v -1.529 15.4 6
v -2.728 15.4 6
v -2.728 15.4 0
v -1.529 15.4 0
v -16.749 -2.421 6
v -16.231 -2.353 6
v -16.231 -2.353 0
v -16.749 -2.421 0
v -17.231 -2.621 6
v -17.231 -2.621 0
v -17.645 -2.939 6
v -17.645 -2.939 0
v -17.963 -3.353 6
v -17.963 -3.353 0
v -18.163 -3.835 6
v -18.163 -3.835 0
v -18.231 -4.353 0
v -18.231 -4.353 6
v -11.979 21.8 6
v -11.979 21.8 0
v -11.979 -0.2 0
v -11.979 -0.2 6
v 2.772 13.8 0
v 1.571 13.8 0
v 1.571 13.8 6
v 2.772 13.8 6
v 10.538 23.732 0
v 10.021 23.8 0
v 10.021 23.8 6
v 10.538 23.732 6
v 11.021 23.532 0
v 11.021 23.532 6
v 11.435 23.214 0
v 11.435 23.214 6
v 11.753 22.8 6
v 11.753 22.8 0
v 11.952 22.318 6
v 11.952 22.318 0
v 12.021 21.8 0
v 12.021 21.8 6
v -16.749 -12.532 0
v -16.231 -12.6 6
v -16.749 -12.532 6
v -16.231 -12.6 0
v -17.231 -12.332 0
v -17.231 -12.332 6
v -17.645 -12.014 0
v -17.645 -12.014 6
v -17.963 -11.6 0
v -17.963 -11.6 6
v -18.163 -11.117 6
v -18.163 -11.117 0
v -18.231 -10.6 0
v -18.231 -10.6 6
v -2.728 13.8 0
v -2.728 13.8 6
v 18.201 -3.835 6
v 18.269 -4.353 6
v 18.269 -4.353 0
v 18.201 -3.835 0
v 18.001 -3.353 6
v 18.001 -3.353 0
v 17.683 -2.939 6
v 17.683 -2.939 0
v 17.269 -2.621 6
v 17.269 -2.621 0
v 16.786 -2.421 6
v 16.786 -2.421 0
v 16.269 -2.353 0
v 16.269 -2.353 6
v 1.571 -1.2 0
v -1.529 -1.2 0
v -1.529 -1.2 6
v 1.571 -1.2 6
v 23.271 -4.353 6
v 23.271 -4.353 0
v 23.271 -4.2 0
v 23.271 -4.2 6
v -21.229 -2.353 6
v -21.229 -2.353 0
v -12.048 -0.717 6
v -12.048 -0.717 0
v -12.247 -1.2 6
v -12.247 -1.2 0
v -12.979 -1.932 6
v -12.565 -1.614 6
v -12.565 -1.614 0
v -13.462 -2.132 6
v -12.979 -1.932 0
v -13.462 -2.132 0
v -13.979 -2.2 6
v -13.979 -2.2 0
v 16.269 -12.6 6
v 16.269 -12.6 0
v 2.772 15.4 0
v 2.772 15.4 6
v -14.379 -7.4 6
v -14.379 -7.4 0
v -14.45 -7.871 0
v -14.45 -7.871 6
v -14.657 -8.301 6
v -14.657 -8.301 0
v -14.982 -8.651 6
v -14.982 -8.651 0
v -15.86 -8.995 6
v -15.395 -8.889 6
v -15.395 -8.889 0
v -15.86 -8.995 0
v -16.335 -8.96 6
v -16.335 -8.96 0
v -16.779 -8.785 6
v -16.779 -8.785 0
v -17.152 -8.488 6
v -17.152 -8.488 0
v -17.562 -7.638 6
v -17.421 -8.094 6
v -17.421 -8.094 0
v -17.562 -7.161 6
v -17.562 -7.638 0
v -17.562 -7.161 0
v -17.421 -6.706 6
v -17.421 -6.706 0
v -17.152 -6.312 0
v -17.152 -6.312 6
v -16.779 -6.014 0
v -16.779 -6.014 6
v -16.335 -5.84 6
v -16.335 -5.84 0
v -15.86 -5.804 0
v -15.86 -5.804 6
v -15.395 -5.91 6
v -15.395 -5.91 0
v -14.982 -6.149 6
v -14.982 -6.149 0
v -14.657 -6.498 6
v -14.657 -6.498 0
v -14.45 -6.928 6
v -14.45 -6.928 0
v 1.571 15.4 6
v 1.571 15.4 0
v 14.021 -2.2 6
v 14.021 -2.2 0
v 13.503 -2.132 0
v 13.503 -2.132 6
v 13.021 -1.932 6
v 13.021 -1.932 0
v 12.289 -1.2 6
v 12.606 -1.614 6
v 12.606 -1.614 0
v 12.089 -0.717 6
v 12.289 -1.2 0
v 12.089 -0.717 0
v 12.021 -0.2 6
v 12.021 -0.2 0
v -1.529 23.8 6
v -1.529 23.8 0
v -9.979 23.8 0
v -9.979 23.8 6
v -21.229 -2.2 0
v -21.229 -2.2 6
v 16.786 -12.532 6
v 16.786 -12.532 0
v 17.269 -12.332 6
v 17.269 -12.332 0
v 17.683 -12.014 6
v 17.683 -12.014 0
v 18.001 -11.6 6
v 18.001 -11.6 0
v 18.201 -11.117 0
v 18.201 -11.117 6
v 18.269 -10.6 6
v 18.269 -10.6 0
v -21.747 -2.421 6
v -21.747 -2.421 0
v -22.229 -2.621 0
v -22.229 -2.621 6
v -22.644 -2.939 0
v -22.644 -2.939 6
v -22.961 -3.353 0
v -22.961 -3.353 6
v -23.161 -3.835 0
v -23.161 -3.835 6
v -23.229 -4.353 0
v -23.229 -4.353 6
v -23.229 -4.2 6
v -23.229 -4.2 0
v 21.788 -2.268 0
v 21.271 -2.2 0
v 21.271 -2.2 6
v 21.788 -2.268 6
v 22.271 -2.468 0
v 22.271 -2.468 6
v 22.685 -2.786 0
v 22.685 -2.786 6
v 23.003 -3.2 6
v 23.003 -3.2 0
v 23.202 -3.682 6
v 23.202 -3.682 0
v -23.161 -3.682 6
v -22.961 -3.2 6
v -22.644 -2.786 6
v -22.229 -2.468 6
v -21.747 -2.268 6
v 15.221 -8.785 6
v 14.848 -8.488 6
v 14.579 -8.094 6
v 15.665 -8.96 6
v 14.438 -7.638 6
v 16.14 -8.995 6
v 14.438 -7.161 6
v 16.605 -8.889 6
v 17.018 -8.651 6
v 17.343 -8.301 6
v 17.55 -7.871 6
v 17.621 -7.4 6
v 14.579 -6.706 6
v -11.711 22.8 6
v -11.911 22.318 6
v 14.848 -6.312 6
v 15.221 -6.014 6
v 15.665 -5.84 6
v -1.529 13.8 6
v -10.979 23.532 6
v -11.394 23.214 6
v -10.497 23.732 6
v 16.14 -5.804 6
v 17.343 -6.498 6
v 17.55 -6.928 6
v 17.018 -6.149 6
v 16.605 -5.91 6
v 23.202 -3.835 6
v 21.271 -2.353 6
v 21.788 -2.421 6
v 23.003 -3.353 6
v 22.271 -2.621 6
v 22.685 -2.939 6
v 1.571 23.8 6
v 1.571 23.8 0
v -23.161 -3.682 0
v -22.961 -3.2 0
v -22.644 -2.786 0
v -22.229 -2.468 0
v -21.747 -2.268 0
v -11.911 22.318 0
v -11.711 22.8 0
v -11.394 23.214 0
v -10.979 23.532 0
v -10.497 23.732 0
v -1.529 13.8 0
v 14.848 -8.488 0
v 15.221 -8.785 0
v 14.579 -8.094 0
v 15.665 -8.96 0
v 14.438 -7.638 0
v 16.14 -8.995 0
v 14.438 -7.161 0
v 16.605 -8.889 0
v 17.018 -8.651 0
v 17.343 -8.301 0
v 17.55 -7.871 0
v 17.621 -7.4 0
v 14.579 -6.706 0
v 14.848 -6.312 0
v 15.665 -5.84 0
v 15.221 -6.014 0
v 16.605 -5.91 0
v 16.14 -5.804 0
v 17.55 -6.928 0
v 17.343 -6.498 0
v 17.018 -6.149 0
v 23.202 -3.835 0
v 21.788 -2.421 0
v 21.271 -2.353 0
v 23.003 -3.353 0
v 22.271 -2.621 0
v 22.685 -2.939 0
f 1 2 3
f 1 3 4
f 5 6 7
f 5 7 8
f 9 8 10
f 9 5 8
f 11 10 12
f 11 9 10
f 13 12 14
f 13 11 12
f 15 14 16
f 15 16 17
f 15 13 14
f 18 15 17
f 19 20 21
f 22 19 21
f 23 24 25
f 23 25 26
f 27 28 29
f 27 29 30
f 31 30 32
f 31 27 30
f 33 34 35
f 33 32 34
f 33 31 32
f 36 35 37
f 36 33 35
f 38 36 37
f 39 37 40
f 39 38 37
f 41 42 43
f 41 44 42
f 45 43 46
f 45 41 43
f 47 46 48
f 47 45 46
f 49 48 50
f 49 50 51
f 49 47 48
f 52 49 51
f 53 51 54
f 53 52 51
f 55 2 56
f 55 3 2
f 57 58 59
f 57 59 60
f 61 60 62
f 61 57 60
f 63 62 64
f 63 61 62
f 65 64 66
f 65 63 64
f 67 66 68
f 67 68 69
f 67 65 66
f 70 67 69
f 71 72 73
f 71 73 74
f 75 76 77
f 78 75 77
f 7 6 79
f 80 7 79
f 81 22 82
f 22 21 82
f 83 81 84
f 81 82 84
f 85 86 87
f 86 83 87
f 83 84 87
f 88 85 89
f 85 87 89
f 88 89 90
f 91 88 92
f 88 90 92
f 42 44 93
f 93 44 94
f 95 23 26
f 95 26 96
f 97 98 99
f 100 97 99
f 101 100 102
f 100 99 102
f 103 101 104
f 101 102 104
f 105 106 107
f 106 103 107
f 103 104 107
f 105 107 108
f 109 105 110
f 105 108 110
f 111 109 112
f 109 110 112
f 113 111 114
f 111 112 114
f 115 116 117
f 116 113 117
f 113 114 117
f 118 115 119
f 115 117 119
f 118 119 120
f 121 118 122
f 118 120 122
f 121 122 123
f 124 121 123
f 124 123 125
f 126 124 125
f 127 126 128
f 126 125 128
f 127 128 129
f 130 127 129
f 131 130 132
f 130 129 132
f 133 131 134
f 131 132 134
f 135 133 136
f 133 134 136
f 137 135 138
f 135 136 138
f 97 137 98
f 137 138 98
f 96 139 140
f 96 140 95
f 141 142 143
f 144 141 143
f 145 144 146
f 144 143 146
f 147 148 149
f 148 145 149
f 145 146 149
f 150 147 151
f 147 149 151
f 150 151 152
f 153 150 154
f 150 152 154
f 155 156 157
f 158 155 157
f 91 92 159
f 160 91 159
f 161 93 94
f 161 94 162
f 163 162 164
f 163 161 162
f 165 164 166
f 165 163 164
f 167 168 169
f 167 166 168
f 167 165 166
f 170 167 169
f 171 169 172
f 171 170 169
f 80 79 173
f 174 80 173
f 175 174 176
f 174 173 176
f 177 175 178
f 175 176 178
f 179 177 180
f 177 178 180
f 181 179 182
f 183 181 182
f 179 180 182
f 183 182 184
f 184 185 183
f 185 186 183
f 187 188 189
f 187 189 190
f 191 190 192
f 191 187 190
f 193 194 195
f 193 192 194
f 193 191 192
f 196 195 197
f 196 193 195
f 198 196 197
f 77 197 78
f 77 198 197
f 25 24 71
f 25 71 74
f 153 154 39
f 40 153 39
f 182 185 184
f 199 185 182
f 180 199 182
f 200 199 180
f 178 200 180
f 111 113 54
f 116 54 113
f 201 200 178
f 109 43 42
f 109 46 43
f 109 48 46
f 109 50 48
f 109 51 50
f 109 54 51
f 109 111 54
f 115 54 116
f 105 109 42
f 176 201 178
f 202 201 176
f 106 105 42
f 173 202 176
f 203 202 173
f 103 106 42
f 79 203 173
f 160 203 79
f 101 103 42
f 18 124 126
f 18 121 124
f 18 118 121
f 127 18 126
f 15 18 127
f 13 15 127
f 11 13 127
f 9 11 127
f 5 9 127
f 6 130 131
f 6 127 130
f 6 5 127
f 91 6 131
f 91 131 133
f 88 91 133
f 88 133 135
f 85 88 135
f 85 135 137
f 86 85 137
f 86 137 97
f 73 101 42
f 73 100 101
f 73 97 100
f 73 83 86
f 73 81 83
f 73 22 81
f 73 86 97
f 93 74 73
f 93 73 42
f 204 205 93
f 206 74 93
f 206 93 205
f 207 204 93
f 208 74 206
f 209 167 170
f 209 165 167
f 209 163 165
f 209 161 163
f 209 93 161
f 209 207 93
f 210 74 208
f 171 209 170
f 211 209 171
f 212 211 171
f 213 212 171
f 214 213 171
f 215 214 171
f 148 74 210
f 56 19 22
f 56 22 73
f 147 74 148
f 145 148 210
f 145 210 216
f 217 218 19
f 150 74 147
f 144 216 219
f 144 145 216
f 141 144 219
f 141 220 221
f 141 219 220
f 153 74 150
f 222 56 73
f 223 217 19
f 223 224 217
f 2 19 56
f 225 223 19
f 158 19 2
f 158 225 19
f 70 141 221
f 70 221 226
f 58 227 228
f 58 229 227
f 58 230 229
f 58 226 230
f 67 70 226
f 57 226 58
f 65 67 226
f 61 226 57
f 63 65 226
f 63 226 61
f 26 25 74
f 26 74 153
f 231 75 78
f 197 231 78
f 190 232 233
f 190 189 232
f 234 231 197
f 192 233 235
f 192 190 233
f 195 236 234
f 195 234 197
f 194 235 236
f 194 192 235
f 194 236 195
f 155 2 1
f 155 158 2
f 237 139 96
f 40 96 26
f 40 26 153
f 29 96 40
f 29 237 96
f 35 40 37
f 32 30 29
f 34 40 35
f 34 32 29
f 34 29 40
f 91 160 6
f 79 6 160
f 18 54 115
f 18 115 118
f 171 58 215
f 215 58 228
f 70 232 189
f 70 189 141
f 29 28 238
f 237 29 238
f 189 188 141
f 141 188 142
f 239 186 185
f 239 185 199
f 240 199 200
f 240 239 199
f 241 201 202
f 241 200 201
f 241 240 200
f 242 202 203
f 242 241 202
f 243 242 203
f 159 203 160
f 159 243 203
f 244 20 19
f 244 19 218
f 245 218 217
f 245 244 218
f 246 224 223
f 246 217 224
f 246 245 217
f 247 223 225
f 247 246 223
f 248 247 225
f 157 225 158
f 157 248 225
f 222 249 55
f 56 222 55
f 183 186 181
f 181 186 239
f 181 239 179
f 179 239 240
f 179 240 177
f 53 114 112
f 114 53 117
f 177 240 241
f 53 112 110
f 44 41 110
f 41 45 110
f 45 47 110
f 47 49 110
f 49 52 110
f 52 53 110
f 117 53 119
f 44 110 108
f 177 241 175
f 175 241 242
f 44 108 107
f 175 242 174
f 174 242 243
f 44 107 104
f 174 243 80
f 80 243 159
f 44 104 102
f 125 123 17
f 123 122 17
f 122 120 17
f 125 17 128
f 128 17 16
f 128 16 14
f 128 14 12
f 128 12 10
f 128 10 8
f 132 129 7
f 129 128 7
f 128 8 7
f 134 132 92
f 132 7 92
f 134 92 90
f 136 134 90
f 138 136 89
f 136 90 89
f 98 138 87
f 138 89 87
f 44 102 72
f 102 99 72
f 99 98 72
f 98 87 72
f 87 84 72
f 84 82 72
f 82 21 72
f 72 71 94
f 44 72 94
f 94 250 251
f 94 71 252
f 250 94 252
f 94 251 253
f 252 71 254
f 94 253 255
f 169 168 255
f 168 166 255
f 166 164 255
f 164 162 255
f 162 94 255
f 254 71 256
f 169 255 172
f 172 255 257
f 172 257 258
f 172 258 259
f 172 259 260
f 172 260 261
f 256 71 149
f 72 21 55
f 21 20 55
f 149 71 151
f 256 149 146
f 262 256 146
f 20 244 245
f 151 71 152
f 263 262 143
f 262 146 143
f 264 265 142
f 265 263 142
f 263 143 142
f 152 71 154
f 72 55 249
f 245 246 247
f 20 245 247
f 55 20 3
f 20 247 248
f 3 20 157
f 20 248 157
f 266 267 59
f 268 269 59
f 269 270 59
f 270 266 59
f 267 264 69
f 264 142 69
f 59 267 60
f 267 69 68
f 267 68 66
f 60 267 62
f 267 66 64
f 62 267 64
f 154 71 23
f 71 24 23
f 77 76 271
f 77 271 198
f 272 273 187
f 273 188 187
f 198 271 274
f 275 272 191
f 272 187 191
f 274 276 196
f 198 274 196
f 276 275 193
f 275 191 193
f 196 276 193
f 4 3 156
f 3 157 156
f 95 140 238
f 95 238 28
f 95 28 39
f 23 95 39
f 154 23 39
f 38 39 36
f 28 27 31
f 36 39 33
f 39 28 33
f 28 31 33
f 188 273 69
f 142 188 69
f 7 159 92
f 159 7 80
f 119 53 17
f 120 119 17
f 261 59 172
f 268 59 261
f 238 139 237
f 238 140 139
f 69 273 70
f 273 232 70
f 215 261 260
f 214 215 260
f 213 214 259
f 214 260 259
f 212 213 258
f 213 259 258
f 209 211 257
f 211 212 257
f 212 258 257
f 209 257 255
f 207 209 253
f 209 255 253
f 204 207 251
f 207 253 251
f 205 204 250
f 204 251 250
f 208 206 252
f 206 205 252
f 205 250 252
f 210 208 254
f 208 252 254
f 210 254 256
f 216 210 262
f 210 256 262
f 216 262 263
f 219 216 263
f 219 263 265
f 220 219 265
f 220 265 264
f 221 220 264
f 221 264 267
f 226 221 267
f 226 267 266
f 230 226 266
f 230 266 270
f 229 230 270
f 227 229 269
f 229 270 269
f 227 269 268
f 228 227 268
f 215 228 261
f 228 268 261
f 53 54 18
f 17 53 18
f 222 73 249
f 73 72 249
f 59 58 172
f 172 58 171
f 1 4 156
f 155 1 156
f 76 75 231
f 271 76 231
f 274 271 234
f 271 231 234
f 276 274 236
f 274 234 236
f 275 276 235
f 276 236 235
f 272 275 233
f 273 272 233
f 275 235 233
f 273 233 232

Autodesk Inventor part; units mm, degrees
ref_plane "YZ Plane" through (0, 0, 0) normal (1, 0, 0) x (0, 1, 0)
ref_plane "XZ Plane" through (0, 0, 0) normal (0, 1, 0) x (-1, 0, 0)
ref_plane "XY Plane" through (0, 0, 0) normal (0, 0, 1) x (1, 0, 0)
sketch "Sketch1" plane through (0, 0, 0) normal (0, 0, 1) x (1, 0, 0)
  line L0 (-21.2294, -12.5998) -> (21.2706, -12.5998)
  line L1 (23.2706, -10.5998) -> (23.2706, -4.1998)
  line L2 (-23.2294, -4.1998) -> (-23.2294, -10.5998)
  line L3 (12.0206, -0.1998) -> (12.0206, 21.8002)
  line L4 (10.0206, 23.8002) -> (-9.9794, 23.8002)
  line L5 (-11.9794, 21.8002) -> (-11.9794, -0.1998)
  circle A0 centre (16.0206, -7.3998) radius 1.6
  circle A1 centre (-15.9794, -7.3998) radius 1.6
  line L6 (21.2706, -2.1998) -> (14.0206, -2.1998)
  line L7 (-13.9794, -2.1998) -> (-21.2294, -2.1998)
  line L8 (0.0206, 11.8002) -> (-1.5294, 11.8002)
  line L9 (-1.5294, 11.8002) -> (1.5706, 11.8002)
  line L10 (-1.5294, 11.8002) -> (-1.5294, 13.8002)
  line L11 (-1.5294, 13.8002) -> (-2.7282, 13.8002)
  line L12 (2.7718, 13.8002) -> (2.7718, 15.8002)
  line L13 (-2.7282, 15.8002) -> (-2.7282, 13.8002)
  line L14 (-2.7282, 15.8002) -> (-1.5294, 15.8002)
  line L15 (0.0206, 15.8002) -> (0.0218, 15.8002)
  line L16 (2.7718, 15.8002) -> (1.5706, 15.8002)
  line L17 (-1.5294, 15.8002) -> (-2.7282, 15.8002)
  line L18 (-1.5294, 11.8002) -> (-1.5294, 13.8002)
  line L19 (-1.5294, 15.8002) -> (-1.5294, 23.8002)
  line L20 (-2.7282, 13.8002) -> (-1.5294, 13.8002)
  line L21 (1.5706, 13.8002) -> (2.7718, 13.8002)
  line L22 (1.5706, 11.8002) -> (1.5706, 13.8002)
  line L23 (1.5706, 15.8002) -> (1.5706, 23.8002)
  arc A2 (23.2706, -4.1998) -> (21.2706, -2.1998) centre (21.2706, -4.1998) ccw
  arc A3 (21.2706, -12.5998) -> (23.2706, -10.5998) centre (21.2706, -10.5998) ccw
  arc A4 (-23.2294, -10.5998) -> (-21.2294, -12.5998) centre (-21.2294, -10.5998) ccw
  arc A5 (-21.2294, -2.1998) -> (-23.2294, -4.1998) centre (-21.2294, -4.1998) ccw
  arc A6 (-13.9794, -2.1998) -> (-11.9794, -0.1998) centre (-13.9794, -0.1998) ccw
  arc A7 (12.0206, -0.1998) -> (14.0206, -2.1998) centre (14.0206, -0.1998) ccw
  arc A8 (-9.9794, 23.8002) -> (-11.9794, 21.8002) centre (-9.9794, 21.8002) ccw
  arc A9 (12.0206, 21.8002) -> (10.0206, 23.8002) centre (10.0206, 21.8002) ccw
  point P0 (0, 0)
  point P1 (0, 0)
  point P2 (12.0206, 23.8002)
  point P3 (-11.9794, 23.8002)
  dimension "d0" = 24
  dimension "d1" = 3.2
  dimension "d2" = 3.2
  dimension "d3" = 2
extrude "Extrusion1" add sketch "Sketch1" along normal blind 6 contours A4 L2 A5 L7 A6 L5 A8 L4 L19 L14 L13 L11 L10 L8 L9 L22 L21 L12 L16 L23 A9 L3 A7 L6 A2 L1 A3 L0
sketch "Sketch2" plane through (0, 0, 6) normal (0, 0, 1) x (1, 0, 0)
  circle A0 centre (-6.9812, 28.6469) radius 1.6
  circle A1 centre (7.0188, 28.6469) radius 1.6
  circle A2 centre (-17.6062, 13.3479) radius 1.6
  circle A3 centre (17.6438, 13.3479) radius 1.6
  line L0 (-23.2312, 26.8921) -> (-23.2312, -30.3531)
  arc A4 (-23.2312, -30.3531) -> (-21.2312, -32.3531) centre (-21.2312, -30.3531) ccw
  line L1 (-21.2312, -32.3531) -> (-7.8931, -32.3531)
  arc A5 (21.2688, -32.3531) -> (23.2688, -30.3531) centre (21.2688, -30.3531) ccw
  line L2 (23.2688, -30.3531) -> (23.2688, 26.8921)
  arc A6 (23.2688, 26.8921) -> (21.8599, 27.8047) centre (22.2688, 26.8921) ccw
  arc A7 (12.0188, 33.6469) -> (21.8599, 27.8047) centre (18.9975, 34.1927) ccw
  line L3 (12.0188, 33.6469) -> (12.0188, 39.5469)
  arc A8 (12.0188, 39.5469) -> (10.0188, 41.5469) centre (10.0188, 39.5469) ccw
  line L4 (10.0188, 41.5469) -> (2.5188, 41.5469)
  arc A9 (2.5188, 41.5469) -> (1.5188, 40.5469) centre (2.5188, 40.5469) ccw
  line L5 (1.5188, 40.5469) -> (1.5188, 36.5469)
  line L6 (1.5188, 36.5469) -> (2.7688, 36.5469)
  line L7 (2.7688, 36.5469) -> (2.7688, 33.6469)
  line L8 (2.7688, 33.6469) -> (1.5688, 33.6469)
  line L9 (1.5688, 33.6469) -> (1.5688, 23.6469)
  line L10 (1.5688, 23.6469) -> (10.0188, 23.6469)
  arc A10 (12.0188, 21.6469) -> (10.0188, 23.6469) centre (10.0188, 21.6469) ccw
  line L11 (12.0188, 21.6469) -> (12.0188, -0.3531)
  arc A11 (12.0188, -0.3531) -> (14.0188, -2.3531) centre (14.0188, -0.3531) ccw
  line L12 (14.0206, -2.3531) -> (16.2688, -2.3531)
  arc A12 (18.2688, -4.3531) -> (16.2688, -2.3531) centre (16.2688, -4.3531) ccw
  line L13 (18.2688, -4.3531) -> (18.2688, -21.3531)
  arc A13 (16.2688, -23.3531) -> (18.2688, -21.3531) centre (16.2688, -21.3531) ccw
  line L14 (16.2688, -23.3531) -> (-16.2312, -23.3531)
  arc A14 (-18.2312, -21.3531) -> (-16.2312, -23.3531) centre (-16.2312, -21.3531) ccw
  line L15 (-18.2312, -21.3531) -> (-18.2312, -4.3531)
  arc A15 (-16.2312, -2.3531) -> (-18.2312, -4.3531) centre (-16.2312, -4.3531) ccw
  line L16 (-16.2312, -2.3531) -> (-13.9794, -2.3531)
  arc A16 (-13.9794, -2.3531) -> (-11.9812, -0.5065) centre (-13.9753, -0.3531) ccw
  line L17 (-11.9812, -0.5065) -> (-11.9812, 21.4935)
  arc A17 (-9.9812, 23.4935) -> (-11.9812, 21.4935) centre (-9.9812, 21.4935) ccw
  line L18 (-9.9812, 23.4935) -> (-1.5312, 23.4935)
  line L19 (-1.5312, 23.4935) -> (-1.5312, 33.4935)
  line L20 (-1.5312, 33.4935) -> (-2.7312, 33.4935)
  line L21 (-2.7312, 33.4935) -> (-2.7312, 36.3935)
  line L22 (-2.7312, 36.3935) -> (-1.4812, 36.3935)
  line L23 (-1.4812, 36.3935) -> (-1.4812, 40.5469)
  arc A18 (-1.4812, 40.5469) -> (-2.4812, 41.5469) centre (-2.4812, 40.5469) ccw
  line L24 (-2.4812, 41.5469) -> (-9.9812, 41.5469)
  arc A19 (-9.9812, 41.5469) -> (-11.9812, 39.5469) centre (-9.9812, 39.5469) ccw
  line L25 (-11.9812, 39.5469) -> (-11.9812, 33.6469)
  arc A20 (-21.8223, 27.8047) -> (-11.9812, 33.6469) centre (-18.9599, 34.1927) ccw
  arc A21 (-21.8223, 27.8047) -> (-23.2312, 26.8921) centre (-22.2312, 26.8921) ccw
  line L26 (-13.9794, -2.3531) -> (-21.2294, -2.3531)
  arc A22 (-21.2294, -2.3531) -> (-23.2294, -4.3531) centre (-21.2294, -4.3531) ccw
  line L27 (-23.2294, -4.3531) -> (-23.2294, -10.7531)
  arc A23 (-23.2294, -10.7531) -> (-21.2294, -12.7531) centre (-21.2294, -10.7531) ccw
  line L28 (-21.2294, -12.7531) -> (21.2706, -12.7531)
  line L29 (21.2706, -2.3531) -> (14.0206, -2.3531)
  arc A24 (23.2706, -4.3531) -> (21.2706, -2.3531) centre (21.2706, -4.3531) ccw
  line L30 (23.2706, -10.7531) -> (23.2706, -4.3531)
  arc A25 (21.2706, -12.7531) -> (23.2706, -10.7531) centre (21.2706, -10.7531) ccw
  arc A26 (5.9613, -30.7014) -> (7.9307, -32.3531) centre (7.9307, -30.3531) ccw
  line L31 (7.9307, -32.3531) -> (21.2688, -32.3531)
  arc A27 (-7.8931, -32.3531) -> (-5.9236, -30.7014) centre (-7.8931, -30.3531) ccw
  arc A28 (5.9613, -30.7014) -> (-5.9236, -30.7014) centre (0.0188, -31.7522) ccw
  point P0 (0, 0)
  point P1 (-18.2312, -12.7531)
  point P2 (18.2688, -12.7531)
extrude "Extrusion2" cut sketch "Sketch2" against normal blind 6 contours A22 L26 A15 L15 L28 A23 L0 | L13 A12 L29 A24 L2 A25 L28
fillet "Fillet1" radius 2 2 edges at (18.2688, -12.5998, 3) (-18.2312, -12.5998, 3)
sketch "Sketch4" plane through (-1.5294, 11.8002, 0) normal (0, 1, 0) x (1, 0, 0)
  line L0 (3.1, 0) -> (0, 0) projected
  line L1 (0, 0) -> (0, -6) projected
  line L2 (3.1, -6) -> (0, -6) projected
  line L3 (3.1, 0) -> (3.1, -6) projected
  point P0 (1.5294, 0)
extrude "Extrusion3" cut sketch "Sketch4" against normal blind 13
sketch "Sketch5" plane through (-2.7282, 15.8002, 0) normal (0, -1, 0) x (1, 0, 0)
  line L0 (0, 0) -> (1.1988, 0) projected
  line L1 (1.1988, 0) -> (1.1988, 6) projected
  line L2 (0, 6) -> (1.1988, 6) projected
  line L3 (0, 0) -> (0, 6) projected
  line L4 (4.2988, 0) -> (5.5, 0) projected
  line L5 (5.5, 0) -> (5.5, 6) projected
  line L6 (4.2988, 6) -> (5.5, 6) projected
  line L7 (4.2988, 0) -> (4.2988, 6) projected
  point P0 (2.7282, 0)
extrude "Extrusion4" add sketch "Sketch5" along normal blind 0.4
sketch "Sketch6" plane through (0, 0, 6) normal (0, 0, 1) x (1, 0, 0)
  line L0 (22.9743, 18.6641) -> (86.0826, 18.6641) construction
  line L1 (86.0826, 18.6641) -> (86.0826, -0.0954) construction
  line L2 (86.0826, -0.0954) -> (22.9743, -0.0954) construction
  line L3 (22.9743, -0.0954) -> (22.9743, 18.6641) construction
  point P0 (0, 0)
extrude "Extrusion5" [suppressed]
properties part number "Hotend Slide Part 1"
